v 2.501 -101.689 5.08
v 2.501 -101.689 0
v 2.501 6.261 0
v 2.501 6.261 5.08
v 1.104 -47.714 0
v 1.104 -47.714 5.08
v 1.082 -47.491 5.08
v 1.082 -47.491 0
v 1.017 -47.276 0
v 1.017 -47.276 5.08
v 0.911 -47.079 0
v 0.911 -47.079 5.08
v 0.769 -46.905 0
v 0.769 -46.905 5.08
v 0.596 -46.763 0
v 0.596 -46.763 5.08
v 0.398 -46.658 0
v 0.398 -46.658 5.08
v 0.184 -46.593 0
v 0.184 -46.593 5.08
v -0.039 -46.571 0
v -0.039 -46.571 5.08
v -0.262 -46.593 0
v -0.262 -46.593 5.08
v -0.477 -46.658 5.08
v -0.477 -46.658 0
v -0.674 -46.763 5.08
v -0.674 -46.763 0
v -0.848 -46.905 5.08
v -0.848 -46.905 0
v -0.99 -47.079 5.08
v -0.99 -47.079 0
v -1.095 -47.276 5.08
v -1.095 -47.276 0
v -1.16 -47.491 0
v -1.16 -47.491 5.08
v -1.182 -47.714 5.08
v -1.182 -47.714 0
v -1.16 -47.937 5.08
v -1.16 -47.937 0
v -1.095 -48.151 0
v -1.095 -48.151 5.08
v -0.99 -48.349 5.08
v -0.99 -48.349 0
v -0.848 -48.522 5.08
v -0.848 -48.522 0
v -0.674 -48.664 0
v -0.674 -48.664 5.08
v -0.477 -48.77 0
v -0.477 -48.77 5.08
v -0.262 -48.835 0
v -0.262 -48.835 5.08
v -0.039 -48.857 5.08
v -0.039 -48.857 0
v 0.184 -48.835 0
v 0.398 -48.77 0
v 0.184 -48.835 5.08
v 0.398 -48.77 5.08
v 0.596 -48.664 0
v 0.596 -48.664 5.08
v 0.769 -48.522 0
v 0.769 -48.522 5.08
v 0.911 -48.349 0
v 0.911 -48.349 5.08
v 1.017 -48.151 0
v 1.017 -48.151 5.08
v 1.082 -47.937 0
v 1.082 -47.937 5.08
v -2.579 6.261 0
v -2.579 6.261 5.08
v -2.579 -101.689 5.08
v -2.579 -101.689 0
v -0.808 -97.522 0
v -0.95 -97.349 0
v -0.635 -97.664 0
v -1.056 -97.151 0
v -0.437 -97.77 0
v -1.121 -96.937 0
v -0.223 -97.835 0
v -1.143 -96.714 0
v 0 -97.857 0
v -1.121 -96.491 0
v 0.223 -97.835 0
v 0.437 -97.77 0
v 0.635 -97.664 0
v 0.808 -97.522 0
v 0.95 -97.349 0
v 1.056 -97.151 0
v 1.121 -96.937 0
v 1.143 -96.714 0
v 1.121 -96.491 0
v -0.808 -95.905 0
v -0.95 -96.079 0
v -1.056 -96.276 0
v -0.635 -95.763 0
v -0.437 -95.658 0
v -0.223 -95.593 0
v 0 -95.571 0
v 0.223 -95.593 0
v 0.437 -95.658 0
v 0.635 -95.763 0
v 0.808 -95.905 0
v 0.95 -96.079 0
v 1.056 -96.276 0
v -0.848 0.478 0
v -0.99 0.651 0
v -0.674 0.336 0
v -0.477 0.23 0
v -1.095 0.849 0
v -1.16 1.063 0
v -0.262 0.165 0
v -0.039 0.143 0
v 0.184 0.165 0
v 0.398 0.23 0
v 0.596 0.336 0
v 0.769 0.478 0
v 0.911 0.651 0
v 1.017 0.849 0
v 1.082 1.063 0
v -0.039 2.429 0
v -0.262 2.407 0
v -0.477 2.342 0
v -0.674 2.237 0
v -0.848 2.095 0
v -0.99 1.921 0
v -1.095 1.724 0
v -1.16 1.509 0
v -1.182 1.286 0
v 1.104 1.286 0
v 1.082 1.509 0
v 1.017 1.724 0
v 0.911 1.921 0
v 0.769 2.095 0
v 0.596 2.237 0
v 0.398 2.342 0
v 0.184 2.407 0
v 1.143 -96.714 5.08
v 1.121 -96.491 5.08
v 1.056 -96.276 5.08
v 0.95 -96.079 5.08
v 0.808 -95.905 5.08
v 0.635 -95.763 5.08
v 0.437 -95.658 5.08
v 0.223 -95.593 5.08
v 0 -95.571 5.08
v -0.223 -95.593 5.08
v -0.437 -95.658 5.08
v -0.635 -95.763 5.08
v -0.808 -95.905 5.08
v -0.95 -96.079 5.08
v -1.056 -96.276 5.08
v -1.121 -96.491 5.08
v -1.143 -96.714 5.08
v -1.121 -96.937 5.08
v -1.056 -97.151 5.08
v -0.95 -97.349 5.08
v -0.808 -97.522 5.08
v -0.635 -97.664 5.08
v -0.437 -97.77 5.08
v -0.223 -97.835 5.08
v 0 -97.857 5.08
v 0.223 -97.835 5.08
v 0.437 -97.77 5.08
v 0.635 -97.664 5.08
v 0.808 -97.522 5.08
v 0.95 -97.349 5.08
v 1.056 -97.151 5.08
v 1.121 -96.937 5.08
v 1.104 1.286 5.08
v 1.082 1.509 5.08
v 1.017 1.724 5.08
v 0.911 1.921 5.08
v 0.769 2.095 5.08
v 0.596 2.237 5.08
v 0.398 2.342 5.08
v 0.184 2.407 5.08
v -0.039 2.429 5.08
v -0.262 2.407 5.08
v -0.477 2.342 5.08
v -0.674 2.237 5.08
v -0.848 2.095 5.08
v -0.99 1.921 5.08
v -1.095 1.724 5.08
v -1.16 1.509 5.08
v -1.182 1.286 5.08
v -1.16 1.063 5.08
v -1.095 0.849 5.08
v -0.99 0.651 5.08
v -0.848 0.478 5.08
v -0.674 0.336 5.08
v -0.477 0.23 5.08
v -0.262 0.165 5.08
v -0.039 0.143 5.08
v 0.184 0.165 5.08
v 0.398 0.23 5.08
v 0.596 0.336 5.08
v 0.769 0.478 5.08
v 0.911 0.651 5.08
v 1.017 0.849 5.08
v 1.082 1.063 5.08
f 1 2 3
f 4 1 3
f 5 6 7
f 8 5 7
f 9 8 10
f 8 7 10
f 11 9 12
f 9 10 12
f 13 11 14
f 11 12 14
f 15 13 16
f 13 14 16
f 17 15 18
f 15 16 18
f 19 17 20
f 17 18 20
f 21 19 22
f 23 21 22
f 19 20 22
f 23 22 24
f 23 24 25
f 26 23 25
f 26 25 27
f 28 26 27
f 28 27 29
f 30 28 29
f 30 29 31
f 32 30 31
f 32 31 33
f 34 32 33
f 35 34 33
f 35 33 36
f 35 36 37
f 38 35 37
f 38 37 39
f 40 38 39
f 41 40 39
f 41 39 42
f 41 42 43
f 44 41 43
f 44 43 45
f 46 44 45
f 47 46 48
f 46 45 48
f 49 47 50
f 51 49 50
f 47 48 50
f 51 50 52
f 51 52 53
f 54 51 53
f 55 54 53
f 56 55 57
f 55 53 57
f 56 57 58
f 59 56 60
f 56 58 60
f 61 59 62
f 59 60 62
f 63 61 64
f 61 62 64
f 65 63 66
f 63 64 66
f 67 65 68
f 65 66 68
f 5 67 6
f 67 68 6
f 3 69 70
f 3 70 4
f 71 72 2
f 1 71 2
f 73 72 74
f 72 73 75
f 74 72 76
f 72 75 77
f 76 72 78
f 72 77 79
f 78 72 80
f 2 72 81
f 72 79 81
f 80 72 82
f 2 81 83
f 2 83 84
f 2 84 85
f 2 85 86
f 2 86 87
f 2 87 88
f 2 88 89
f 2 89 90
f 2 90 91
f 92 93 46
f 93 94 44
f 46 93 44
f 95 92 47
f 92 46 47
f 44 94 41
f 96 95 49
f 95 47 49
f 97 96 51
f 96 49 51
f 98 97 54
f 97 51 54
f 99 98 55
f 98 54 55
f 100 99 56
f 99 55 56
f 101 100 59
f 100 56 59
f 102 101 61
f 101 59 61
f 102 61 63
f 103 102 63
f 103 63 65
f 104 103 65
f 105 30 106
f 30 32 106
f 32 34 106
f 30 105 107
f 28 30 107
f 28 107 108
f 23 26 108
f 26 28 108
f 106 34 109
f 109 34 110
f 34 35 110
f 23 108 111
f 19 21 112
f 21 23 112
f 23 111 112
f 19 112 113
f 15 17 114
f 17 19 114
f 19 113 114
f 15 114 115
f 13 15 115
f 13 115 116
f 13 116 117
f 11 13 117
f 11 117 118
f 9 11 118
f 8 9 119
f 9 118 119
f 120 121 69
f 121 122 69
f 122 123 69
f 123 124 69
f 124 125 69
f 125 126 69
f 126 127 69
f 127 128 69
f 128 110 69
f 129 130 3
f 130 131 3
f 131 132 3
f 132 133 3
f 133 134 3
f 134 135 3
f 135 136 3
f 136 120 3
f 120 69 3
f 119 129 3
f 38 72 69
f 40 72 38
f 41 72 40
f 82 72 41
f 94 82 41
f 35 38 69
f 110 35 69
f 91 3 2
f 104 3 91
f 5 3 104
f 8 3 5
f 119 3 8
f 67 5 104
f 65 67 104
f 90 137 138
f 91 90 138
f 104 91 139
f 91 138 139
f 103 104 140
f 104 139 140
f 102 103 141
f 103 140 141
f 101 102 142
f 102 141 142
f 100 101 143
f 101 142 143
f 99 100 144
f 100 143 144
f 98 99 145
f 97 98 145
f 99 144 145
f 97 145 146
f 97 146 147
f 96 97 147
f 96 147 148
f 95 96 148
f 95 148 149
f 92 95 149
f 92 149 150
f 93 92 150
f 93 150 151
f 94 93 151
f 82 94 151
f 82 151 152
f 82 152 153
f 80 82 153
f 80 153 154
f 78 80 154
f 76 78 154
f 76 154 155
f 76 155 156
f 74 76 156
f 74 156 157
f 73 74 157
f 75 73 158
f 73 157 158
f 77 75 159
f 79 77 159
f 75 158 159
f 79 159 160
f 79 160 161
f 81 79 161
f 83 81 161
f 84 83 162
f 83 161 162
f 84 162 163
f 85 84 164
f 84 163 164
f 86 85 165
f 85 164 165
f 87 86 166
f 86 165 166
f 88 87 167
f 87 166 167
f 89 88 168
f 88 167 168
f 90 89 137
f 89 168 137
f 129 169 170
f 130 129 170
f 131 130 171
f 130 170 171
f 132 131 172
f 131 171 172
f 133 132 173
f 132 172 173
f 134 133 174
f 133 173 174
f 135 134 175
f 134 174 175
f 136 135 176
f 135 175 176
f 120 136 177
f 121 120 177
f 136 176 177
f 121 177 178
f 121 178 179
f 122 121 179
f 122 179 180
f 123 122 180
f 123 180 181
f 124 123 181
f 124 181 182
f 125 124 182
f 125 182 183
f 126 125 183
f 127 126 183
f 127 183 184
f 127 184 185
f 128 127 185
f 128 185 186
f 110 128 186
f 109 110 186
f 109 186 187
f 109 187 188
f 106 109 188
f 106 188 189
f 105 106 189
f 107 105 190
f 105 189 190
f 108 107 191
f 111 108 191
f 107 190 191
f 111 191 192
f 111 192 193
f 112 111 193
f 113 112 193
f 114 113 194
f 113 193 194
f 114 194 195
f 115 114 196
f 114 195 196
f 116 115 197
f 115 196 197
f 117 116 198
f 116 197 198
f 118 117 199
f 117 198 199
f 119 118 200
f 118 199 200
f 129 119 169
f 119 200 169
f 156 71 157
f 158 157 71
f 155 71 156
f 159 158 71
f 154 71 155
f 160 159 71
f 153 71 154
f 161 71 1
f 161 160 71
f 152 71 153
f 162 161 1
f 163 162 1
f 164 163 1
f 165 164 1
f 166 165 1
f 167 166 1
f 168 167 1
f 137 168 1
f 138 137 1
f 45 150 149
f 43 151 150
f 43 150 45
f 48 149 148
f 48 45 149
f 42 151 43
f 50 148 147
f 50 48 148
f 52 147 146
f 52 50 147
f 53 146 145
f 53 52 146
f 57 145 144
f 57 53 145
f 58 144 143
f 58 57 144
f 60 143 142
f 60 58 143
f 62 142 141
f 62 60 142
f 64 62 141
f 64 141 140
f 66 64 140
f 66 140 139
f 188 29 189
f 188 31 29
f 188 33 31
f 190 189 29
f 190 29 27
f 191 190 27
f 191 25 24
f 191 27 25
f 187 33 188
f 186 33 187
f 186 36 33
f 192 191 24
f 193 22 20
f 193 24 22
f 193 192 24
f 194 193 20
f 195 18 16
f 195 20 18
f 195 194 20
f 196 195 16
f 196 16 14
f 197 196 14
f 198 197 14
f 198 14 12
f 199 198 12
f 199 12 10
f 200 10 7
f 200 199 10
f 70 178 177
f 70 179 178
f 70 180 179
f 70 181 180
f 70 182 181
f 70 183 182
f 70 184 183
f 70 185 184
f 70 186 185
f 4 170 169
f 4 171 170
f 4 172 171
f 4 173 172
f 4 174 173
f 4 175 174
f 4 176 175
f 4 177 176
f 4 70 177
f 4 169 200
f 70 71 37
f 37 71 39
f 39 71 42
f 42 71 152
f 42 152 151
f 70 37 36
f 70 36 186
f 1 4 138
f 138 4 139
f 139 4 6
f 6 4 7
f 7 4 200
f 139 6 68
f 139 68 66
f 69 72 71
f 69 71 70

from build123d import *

# Parameters (mm, degrees)
SKETCH1_W           = 5.079991364
SKETCH1_H           = 107.95
BOSS_EXTRUDE1_DEPTH = 5.08
CUT_EXTRUDE1_REACH  = 103.848
SKETCH3_R           = 1.143


with BuildPart() as part:
    # Sketch1 → Boss-Extrude1 (new body)
    with BuildSketch(Plane.XY):
        with Locations((-0.039375527, -47.713604651)):
            Rectangle(SKETCH1_W, SKETCH1_H)
    extrude(amount=BOSS_EXTRUDE1_DEPTH)

    # Sketch3 → Cut-Extrude1 (cut, up to next)
    with BuildSketch(Plane.XY.offset(5.08), mode=Mode.PRIVATE) as cut_extrude1_sk1:
        with Locations((-0.039375527, -47.713604651)):
            Circle(SKETCH3_R)
    cut_extrude1_tool1 = extrude(cut_extrude1_sk1.sketch, amount=-CUT_EXTRUDE1_REACH, mode=Mode.PRIVATE) & part.part
    # Sketch3 → Cut-Extrude1 (cut, up to next)
    with BuildSketch(Plane.XY.offset(5.08), mode=Mode.PRIVATE) as cut_extrude1_sk2:
        with Locations((-0.039375527, 1.286395349)):
            Circle(SKETCH3_R)
    cut_extrude1_tool2 = extrude(cut_extrude1_sk2.sketch, amount=-CUT_EXTRUDE1_REACH, mode=Mode.PRIVATE) & part.part
    # Sketch3 → Cut-Extrude1 (cut, up to next)
    with BuildSketch(Plane.XY.offset(5.08), mode=Mode.PRIVATE) as cut_extrude1_sk3:
        with Locations((0, -96.713604651)):
            Circle(SKETCH3_R)
    cut_extrude1_tool3 = extrude(cut_extrude1_sk3.sketch, amount=-CUT_EXTRUDE1_REACH, mode=Mode.PRIVATE) & part.part
    add(cut_extrude1_tool1.solids().sort_by_distance((-0.039376, -47.713605, 5.08))[0], mode=Mode.SUBTRACT)
    add(cut_extrude1_tool2.solids().sort_by_distance((-0.039376, 1.286395, 5.08))[0], mode=Mode.SUBTRACT)
    add(cut_extrude1_tool3.solids().sort_by_distance((0, -96.713605, 5.08))[0], mode=Mode.SUBTRACT)


solid = part.part
